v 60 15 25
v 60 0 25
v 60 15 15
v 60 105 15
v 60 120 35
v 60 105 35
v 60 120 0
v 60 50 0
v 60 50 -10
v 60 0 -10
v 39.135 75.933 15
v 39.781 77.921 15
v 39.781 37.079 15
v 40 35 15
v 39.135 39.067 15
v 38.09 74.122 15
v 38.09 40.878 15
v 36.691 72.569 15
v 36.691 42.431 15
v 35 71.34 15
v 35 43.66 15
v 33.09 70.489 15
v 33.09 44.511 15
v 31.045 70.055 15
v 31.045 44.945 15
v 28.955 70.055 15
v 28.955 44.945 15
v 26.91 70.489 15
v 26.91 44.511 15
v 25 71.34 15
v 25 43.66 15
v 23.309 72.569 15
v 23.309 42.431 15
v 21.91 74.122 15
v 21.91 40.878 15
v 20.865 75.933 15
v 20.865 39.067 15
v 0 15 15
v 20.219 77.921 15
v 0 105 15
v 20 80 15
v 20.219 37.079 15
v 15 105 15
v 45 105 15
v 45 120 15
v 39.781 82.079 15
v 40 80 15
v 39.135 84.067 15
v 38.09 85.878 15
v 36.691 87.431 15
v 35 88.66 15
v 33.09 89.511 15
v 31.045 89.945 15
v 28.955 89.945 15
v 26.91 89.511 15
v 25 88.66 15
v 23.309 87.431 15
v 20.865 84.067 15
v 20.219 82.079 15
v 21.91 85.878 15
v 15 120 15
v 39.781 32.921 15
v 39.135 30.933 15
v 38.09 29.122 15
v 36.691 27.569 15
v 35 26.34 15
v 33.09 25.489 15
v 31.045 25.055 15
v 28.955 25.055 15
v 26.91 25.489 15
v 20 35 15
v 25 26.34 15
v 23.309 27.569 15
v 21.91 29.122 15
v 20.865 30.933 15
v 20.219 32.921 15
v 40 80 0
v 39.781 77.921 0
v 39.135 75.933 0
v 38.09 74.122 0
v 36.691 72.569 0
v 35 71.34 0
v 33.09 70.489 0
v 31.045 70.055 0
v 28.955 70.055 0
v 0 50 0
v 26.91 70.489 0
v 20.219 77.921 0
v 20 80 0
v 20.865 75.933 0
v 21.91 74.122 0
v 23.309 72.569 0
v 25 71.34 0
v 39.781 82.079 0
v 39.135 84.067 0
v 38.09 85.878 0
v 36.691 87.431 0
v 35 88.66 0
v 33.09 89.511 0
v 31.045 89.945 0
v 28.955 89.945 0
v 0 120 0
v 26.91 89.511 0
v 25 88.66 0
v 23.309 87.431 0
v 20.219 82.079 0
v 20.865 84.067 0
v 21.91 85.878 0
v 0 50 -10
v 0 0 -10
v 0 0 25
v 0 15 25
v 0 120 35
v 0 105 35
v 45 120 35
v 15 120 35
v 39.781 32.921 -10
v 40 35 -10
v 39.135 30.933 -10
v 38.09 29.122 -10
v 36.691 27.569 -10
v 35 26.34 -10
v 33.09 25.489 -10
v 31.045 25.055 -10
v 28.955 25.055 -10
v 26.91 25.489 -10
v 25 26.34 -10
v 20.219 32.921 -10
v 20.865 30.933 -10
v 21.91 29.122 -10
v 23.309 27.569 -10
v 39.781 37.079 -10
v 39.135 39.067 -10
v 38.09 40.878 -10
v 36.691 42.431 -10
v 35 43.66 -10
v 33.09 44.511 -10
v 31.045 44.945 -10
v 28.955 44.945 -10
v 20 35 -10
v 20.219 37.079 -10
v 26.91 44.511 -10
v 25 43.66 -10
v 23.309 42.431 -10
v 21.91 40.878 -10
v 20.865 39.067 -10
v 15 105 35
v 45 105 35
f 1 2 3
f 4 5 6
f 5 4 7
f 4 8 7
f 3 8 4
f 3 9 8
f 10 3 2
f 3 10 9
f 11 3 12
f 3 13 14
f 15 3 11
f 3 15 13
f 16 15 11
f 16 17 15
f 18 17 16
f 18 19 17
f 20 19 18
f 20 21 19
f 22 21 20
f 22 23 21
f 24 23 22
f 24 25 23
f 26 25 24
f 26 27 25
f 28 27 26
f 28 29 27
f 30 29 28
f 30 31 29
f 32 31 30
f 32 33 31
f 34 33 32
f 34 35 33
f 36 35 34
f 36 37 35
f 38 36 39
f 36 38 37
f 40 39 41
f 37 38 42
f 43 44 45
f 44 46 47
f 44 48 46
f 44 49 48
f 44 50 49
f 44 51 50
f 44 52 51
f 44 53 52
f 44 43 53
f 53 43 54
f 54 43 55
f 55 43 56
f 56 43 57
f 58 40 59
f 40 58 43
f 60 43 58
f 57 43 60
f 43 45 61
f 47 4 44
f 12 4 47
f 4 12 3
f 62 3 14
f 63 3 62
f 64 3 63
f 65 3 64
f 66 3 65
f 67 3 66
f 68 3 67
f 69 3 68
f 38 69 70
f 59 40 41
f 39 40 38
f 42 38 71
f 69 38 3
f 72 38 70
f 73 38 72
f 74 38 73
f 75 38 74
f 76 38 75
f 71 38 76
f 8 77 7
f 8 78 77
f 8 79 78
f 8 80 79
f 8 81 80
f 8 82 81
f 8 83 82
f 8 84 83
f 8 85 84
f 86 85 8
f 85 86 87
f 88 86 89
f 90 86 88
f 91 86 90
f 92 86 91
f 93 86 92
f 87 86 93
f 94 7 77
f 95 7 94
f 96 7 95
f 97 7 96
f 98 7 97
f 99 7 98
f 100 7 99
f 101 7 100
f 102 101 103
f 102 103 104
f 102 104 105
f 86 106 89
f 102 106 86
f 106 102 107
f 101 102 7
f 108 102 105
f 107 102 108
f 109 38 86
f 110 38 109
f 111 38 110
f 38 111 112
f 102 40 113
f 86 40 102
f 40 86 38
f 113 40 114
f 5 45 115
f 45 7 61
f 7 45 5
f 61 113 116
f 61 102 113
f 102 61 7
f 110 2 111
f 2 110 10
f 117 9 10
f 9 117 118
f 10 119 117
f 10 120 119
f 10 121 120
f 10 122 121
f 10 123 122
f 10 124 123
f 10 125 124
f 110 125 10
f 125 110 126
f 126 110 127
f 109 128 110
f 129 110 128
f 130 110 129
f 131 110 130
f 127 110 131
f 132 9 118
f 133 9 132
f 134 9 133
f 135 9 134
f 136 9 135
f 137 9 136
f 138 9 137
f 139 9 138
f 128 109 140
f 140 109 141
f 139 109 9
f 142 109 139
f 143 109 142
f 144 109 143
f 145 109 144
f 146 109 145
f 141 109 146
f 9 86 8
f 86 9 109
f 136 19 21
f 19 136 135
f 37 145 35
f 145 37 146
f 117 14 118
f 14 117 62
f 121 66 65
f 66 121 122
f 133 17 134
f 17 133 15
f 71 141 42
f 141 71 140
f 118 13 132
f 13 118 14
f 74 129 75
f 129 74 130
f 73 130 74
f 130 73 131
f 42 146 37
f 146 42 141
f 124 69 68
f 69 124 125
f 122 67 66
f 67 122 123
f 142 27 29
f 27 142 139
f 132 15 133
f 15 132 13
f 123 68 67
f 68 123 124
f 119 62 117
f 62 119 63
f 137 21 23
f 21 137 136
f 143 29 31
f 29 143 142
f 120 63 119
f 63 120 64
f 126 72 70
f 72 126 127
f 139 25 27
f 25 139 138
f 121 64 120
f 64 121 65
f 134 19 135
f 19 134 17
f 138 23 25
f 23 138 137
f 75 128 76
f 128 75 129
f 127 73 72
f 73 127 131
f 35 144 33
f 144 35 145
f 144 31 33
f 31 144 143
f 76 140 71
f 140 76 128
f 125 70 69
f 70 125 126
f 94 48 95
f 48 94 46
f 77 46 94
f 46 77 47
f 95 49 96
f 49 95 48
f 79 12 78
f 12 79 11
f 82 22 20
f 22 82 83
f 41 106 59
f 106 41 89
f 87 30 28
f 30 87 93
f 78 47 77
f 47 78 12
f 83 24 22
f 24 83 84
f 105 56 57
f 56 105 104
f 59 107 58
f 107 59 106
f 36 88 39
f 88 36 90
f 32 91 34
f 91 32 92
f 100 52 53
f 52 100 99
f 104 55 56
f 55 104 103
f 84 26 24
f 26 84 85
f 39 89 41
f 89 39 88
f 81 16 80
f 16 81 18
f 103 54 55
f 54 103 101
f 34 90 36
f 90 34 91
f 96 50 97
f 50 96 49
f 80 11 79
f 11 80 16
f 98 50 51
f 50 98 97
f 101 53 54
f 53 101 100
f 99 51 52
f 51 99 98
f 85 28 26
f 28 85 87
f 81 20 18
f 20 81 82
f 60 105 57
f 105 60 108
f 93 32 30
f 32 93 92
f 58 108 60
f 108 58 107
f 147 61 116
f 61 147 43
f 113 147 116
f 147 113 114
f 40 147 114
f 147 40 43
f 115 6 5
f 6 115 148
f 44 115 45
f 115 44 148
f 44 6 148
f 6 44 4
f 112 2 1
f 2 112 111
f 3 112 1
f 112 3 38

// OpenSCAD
difference() {
    union() {
        cube([60, 120, 15]);
        translate([0,0,-10])
            cube([60, 50, 10]);
    }        

    translate([30,35,-11]) {
        cylinder(h=27, r=10);
        translate([0,45,0])
            cylinder(h=27, r=10);
    }
}

translate([0,0,15]) {
    cube([60, 15, 10]);
    translate([0,120-15,0]) {
        cube([15, 15, 20]);
        translate([60-15,0,0])
            cube([15, 15, 20]);
    }
}
